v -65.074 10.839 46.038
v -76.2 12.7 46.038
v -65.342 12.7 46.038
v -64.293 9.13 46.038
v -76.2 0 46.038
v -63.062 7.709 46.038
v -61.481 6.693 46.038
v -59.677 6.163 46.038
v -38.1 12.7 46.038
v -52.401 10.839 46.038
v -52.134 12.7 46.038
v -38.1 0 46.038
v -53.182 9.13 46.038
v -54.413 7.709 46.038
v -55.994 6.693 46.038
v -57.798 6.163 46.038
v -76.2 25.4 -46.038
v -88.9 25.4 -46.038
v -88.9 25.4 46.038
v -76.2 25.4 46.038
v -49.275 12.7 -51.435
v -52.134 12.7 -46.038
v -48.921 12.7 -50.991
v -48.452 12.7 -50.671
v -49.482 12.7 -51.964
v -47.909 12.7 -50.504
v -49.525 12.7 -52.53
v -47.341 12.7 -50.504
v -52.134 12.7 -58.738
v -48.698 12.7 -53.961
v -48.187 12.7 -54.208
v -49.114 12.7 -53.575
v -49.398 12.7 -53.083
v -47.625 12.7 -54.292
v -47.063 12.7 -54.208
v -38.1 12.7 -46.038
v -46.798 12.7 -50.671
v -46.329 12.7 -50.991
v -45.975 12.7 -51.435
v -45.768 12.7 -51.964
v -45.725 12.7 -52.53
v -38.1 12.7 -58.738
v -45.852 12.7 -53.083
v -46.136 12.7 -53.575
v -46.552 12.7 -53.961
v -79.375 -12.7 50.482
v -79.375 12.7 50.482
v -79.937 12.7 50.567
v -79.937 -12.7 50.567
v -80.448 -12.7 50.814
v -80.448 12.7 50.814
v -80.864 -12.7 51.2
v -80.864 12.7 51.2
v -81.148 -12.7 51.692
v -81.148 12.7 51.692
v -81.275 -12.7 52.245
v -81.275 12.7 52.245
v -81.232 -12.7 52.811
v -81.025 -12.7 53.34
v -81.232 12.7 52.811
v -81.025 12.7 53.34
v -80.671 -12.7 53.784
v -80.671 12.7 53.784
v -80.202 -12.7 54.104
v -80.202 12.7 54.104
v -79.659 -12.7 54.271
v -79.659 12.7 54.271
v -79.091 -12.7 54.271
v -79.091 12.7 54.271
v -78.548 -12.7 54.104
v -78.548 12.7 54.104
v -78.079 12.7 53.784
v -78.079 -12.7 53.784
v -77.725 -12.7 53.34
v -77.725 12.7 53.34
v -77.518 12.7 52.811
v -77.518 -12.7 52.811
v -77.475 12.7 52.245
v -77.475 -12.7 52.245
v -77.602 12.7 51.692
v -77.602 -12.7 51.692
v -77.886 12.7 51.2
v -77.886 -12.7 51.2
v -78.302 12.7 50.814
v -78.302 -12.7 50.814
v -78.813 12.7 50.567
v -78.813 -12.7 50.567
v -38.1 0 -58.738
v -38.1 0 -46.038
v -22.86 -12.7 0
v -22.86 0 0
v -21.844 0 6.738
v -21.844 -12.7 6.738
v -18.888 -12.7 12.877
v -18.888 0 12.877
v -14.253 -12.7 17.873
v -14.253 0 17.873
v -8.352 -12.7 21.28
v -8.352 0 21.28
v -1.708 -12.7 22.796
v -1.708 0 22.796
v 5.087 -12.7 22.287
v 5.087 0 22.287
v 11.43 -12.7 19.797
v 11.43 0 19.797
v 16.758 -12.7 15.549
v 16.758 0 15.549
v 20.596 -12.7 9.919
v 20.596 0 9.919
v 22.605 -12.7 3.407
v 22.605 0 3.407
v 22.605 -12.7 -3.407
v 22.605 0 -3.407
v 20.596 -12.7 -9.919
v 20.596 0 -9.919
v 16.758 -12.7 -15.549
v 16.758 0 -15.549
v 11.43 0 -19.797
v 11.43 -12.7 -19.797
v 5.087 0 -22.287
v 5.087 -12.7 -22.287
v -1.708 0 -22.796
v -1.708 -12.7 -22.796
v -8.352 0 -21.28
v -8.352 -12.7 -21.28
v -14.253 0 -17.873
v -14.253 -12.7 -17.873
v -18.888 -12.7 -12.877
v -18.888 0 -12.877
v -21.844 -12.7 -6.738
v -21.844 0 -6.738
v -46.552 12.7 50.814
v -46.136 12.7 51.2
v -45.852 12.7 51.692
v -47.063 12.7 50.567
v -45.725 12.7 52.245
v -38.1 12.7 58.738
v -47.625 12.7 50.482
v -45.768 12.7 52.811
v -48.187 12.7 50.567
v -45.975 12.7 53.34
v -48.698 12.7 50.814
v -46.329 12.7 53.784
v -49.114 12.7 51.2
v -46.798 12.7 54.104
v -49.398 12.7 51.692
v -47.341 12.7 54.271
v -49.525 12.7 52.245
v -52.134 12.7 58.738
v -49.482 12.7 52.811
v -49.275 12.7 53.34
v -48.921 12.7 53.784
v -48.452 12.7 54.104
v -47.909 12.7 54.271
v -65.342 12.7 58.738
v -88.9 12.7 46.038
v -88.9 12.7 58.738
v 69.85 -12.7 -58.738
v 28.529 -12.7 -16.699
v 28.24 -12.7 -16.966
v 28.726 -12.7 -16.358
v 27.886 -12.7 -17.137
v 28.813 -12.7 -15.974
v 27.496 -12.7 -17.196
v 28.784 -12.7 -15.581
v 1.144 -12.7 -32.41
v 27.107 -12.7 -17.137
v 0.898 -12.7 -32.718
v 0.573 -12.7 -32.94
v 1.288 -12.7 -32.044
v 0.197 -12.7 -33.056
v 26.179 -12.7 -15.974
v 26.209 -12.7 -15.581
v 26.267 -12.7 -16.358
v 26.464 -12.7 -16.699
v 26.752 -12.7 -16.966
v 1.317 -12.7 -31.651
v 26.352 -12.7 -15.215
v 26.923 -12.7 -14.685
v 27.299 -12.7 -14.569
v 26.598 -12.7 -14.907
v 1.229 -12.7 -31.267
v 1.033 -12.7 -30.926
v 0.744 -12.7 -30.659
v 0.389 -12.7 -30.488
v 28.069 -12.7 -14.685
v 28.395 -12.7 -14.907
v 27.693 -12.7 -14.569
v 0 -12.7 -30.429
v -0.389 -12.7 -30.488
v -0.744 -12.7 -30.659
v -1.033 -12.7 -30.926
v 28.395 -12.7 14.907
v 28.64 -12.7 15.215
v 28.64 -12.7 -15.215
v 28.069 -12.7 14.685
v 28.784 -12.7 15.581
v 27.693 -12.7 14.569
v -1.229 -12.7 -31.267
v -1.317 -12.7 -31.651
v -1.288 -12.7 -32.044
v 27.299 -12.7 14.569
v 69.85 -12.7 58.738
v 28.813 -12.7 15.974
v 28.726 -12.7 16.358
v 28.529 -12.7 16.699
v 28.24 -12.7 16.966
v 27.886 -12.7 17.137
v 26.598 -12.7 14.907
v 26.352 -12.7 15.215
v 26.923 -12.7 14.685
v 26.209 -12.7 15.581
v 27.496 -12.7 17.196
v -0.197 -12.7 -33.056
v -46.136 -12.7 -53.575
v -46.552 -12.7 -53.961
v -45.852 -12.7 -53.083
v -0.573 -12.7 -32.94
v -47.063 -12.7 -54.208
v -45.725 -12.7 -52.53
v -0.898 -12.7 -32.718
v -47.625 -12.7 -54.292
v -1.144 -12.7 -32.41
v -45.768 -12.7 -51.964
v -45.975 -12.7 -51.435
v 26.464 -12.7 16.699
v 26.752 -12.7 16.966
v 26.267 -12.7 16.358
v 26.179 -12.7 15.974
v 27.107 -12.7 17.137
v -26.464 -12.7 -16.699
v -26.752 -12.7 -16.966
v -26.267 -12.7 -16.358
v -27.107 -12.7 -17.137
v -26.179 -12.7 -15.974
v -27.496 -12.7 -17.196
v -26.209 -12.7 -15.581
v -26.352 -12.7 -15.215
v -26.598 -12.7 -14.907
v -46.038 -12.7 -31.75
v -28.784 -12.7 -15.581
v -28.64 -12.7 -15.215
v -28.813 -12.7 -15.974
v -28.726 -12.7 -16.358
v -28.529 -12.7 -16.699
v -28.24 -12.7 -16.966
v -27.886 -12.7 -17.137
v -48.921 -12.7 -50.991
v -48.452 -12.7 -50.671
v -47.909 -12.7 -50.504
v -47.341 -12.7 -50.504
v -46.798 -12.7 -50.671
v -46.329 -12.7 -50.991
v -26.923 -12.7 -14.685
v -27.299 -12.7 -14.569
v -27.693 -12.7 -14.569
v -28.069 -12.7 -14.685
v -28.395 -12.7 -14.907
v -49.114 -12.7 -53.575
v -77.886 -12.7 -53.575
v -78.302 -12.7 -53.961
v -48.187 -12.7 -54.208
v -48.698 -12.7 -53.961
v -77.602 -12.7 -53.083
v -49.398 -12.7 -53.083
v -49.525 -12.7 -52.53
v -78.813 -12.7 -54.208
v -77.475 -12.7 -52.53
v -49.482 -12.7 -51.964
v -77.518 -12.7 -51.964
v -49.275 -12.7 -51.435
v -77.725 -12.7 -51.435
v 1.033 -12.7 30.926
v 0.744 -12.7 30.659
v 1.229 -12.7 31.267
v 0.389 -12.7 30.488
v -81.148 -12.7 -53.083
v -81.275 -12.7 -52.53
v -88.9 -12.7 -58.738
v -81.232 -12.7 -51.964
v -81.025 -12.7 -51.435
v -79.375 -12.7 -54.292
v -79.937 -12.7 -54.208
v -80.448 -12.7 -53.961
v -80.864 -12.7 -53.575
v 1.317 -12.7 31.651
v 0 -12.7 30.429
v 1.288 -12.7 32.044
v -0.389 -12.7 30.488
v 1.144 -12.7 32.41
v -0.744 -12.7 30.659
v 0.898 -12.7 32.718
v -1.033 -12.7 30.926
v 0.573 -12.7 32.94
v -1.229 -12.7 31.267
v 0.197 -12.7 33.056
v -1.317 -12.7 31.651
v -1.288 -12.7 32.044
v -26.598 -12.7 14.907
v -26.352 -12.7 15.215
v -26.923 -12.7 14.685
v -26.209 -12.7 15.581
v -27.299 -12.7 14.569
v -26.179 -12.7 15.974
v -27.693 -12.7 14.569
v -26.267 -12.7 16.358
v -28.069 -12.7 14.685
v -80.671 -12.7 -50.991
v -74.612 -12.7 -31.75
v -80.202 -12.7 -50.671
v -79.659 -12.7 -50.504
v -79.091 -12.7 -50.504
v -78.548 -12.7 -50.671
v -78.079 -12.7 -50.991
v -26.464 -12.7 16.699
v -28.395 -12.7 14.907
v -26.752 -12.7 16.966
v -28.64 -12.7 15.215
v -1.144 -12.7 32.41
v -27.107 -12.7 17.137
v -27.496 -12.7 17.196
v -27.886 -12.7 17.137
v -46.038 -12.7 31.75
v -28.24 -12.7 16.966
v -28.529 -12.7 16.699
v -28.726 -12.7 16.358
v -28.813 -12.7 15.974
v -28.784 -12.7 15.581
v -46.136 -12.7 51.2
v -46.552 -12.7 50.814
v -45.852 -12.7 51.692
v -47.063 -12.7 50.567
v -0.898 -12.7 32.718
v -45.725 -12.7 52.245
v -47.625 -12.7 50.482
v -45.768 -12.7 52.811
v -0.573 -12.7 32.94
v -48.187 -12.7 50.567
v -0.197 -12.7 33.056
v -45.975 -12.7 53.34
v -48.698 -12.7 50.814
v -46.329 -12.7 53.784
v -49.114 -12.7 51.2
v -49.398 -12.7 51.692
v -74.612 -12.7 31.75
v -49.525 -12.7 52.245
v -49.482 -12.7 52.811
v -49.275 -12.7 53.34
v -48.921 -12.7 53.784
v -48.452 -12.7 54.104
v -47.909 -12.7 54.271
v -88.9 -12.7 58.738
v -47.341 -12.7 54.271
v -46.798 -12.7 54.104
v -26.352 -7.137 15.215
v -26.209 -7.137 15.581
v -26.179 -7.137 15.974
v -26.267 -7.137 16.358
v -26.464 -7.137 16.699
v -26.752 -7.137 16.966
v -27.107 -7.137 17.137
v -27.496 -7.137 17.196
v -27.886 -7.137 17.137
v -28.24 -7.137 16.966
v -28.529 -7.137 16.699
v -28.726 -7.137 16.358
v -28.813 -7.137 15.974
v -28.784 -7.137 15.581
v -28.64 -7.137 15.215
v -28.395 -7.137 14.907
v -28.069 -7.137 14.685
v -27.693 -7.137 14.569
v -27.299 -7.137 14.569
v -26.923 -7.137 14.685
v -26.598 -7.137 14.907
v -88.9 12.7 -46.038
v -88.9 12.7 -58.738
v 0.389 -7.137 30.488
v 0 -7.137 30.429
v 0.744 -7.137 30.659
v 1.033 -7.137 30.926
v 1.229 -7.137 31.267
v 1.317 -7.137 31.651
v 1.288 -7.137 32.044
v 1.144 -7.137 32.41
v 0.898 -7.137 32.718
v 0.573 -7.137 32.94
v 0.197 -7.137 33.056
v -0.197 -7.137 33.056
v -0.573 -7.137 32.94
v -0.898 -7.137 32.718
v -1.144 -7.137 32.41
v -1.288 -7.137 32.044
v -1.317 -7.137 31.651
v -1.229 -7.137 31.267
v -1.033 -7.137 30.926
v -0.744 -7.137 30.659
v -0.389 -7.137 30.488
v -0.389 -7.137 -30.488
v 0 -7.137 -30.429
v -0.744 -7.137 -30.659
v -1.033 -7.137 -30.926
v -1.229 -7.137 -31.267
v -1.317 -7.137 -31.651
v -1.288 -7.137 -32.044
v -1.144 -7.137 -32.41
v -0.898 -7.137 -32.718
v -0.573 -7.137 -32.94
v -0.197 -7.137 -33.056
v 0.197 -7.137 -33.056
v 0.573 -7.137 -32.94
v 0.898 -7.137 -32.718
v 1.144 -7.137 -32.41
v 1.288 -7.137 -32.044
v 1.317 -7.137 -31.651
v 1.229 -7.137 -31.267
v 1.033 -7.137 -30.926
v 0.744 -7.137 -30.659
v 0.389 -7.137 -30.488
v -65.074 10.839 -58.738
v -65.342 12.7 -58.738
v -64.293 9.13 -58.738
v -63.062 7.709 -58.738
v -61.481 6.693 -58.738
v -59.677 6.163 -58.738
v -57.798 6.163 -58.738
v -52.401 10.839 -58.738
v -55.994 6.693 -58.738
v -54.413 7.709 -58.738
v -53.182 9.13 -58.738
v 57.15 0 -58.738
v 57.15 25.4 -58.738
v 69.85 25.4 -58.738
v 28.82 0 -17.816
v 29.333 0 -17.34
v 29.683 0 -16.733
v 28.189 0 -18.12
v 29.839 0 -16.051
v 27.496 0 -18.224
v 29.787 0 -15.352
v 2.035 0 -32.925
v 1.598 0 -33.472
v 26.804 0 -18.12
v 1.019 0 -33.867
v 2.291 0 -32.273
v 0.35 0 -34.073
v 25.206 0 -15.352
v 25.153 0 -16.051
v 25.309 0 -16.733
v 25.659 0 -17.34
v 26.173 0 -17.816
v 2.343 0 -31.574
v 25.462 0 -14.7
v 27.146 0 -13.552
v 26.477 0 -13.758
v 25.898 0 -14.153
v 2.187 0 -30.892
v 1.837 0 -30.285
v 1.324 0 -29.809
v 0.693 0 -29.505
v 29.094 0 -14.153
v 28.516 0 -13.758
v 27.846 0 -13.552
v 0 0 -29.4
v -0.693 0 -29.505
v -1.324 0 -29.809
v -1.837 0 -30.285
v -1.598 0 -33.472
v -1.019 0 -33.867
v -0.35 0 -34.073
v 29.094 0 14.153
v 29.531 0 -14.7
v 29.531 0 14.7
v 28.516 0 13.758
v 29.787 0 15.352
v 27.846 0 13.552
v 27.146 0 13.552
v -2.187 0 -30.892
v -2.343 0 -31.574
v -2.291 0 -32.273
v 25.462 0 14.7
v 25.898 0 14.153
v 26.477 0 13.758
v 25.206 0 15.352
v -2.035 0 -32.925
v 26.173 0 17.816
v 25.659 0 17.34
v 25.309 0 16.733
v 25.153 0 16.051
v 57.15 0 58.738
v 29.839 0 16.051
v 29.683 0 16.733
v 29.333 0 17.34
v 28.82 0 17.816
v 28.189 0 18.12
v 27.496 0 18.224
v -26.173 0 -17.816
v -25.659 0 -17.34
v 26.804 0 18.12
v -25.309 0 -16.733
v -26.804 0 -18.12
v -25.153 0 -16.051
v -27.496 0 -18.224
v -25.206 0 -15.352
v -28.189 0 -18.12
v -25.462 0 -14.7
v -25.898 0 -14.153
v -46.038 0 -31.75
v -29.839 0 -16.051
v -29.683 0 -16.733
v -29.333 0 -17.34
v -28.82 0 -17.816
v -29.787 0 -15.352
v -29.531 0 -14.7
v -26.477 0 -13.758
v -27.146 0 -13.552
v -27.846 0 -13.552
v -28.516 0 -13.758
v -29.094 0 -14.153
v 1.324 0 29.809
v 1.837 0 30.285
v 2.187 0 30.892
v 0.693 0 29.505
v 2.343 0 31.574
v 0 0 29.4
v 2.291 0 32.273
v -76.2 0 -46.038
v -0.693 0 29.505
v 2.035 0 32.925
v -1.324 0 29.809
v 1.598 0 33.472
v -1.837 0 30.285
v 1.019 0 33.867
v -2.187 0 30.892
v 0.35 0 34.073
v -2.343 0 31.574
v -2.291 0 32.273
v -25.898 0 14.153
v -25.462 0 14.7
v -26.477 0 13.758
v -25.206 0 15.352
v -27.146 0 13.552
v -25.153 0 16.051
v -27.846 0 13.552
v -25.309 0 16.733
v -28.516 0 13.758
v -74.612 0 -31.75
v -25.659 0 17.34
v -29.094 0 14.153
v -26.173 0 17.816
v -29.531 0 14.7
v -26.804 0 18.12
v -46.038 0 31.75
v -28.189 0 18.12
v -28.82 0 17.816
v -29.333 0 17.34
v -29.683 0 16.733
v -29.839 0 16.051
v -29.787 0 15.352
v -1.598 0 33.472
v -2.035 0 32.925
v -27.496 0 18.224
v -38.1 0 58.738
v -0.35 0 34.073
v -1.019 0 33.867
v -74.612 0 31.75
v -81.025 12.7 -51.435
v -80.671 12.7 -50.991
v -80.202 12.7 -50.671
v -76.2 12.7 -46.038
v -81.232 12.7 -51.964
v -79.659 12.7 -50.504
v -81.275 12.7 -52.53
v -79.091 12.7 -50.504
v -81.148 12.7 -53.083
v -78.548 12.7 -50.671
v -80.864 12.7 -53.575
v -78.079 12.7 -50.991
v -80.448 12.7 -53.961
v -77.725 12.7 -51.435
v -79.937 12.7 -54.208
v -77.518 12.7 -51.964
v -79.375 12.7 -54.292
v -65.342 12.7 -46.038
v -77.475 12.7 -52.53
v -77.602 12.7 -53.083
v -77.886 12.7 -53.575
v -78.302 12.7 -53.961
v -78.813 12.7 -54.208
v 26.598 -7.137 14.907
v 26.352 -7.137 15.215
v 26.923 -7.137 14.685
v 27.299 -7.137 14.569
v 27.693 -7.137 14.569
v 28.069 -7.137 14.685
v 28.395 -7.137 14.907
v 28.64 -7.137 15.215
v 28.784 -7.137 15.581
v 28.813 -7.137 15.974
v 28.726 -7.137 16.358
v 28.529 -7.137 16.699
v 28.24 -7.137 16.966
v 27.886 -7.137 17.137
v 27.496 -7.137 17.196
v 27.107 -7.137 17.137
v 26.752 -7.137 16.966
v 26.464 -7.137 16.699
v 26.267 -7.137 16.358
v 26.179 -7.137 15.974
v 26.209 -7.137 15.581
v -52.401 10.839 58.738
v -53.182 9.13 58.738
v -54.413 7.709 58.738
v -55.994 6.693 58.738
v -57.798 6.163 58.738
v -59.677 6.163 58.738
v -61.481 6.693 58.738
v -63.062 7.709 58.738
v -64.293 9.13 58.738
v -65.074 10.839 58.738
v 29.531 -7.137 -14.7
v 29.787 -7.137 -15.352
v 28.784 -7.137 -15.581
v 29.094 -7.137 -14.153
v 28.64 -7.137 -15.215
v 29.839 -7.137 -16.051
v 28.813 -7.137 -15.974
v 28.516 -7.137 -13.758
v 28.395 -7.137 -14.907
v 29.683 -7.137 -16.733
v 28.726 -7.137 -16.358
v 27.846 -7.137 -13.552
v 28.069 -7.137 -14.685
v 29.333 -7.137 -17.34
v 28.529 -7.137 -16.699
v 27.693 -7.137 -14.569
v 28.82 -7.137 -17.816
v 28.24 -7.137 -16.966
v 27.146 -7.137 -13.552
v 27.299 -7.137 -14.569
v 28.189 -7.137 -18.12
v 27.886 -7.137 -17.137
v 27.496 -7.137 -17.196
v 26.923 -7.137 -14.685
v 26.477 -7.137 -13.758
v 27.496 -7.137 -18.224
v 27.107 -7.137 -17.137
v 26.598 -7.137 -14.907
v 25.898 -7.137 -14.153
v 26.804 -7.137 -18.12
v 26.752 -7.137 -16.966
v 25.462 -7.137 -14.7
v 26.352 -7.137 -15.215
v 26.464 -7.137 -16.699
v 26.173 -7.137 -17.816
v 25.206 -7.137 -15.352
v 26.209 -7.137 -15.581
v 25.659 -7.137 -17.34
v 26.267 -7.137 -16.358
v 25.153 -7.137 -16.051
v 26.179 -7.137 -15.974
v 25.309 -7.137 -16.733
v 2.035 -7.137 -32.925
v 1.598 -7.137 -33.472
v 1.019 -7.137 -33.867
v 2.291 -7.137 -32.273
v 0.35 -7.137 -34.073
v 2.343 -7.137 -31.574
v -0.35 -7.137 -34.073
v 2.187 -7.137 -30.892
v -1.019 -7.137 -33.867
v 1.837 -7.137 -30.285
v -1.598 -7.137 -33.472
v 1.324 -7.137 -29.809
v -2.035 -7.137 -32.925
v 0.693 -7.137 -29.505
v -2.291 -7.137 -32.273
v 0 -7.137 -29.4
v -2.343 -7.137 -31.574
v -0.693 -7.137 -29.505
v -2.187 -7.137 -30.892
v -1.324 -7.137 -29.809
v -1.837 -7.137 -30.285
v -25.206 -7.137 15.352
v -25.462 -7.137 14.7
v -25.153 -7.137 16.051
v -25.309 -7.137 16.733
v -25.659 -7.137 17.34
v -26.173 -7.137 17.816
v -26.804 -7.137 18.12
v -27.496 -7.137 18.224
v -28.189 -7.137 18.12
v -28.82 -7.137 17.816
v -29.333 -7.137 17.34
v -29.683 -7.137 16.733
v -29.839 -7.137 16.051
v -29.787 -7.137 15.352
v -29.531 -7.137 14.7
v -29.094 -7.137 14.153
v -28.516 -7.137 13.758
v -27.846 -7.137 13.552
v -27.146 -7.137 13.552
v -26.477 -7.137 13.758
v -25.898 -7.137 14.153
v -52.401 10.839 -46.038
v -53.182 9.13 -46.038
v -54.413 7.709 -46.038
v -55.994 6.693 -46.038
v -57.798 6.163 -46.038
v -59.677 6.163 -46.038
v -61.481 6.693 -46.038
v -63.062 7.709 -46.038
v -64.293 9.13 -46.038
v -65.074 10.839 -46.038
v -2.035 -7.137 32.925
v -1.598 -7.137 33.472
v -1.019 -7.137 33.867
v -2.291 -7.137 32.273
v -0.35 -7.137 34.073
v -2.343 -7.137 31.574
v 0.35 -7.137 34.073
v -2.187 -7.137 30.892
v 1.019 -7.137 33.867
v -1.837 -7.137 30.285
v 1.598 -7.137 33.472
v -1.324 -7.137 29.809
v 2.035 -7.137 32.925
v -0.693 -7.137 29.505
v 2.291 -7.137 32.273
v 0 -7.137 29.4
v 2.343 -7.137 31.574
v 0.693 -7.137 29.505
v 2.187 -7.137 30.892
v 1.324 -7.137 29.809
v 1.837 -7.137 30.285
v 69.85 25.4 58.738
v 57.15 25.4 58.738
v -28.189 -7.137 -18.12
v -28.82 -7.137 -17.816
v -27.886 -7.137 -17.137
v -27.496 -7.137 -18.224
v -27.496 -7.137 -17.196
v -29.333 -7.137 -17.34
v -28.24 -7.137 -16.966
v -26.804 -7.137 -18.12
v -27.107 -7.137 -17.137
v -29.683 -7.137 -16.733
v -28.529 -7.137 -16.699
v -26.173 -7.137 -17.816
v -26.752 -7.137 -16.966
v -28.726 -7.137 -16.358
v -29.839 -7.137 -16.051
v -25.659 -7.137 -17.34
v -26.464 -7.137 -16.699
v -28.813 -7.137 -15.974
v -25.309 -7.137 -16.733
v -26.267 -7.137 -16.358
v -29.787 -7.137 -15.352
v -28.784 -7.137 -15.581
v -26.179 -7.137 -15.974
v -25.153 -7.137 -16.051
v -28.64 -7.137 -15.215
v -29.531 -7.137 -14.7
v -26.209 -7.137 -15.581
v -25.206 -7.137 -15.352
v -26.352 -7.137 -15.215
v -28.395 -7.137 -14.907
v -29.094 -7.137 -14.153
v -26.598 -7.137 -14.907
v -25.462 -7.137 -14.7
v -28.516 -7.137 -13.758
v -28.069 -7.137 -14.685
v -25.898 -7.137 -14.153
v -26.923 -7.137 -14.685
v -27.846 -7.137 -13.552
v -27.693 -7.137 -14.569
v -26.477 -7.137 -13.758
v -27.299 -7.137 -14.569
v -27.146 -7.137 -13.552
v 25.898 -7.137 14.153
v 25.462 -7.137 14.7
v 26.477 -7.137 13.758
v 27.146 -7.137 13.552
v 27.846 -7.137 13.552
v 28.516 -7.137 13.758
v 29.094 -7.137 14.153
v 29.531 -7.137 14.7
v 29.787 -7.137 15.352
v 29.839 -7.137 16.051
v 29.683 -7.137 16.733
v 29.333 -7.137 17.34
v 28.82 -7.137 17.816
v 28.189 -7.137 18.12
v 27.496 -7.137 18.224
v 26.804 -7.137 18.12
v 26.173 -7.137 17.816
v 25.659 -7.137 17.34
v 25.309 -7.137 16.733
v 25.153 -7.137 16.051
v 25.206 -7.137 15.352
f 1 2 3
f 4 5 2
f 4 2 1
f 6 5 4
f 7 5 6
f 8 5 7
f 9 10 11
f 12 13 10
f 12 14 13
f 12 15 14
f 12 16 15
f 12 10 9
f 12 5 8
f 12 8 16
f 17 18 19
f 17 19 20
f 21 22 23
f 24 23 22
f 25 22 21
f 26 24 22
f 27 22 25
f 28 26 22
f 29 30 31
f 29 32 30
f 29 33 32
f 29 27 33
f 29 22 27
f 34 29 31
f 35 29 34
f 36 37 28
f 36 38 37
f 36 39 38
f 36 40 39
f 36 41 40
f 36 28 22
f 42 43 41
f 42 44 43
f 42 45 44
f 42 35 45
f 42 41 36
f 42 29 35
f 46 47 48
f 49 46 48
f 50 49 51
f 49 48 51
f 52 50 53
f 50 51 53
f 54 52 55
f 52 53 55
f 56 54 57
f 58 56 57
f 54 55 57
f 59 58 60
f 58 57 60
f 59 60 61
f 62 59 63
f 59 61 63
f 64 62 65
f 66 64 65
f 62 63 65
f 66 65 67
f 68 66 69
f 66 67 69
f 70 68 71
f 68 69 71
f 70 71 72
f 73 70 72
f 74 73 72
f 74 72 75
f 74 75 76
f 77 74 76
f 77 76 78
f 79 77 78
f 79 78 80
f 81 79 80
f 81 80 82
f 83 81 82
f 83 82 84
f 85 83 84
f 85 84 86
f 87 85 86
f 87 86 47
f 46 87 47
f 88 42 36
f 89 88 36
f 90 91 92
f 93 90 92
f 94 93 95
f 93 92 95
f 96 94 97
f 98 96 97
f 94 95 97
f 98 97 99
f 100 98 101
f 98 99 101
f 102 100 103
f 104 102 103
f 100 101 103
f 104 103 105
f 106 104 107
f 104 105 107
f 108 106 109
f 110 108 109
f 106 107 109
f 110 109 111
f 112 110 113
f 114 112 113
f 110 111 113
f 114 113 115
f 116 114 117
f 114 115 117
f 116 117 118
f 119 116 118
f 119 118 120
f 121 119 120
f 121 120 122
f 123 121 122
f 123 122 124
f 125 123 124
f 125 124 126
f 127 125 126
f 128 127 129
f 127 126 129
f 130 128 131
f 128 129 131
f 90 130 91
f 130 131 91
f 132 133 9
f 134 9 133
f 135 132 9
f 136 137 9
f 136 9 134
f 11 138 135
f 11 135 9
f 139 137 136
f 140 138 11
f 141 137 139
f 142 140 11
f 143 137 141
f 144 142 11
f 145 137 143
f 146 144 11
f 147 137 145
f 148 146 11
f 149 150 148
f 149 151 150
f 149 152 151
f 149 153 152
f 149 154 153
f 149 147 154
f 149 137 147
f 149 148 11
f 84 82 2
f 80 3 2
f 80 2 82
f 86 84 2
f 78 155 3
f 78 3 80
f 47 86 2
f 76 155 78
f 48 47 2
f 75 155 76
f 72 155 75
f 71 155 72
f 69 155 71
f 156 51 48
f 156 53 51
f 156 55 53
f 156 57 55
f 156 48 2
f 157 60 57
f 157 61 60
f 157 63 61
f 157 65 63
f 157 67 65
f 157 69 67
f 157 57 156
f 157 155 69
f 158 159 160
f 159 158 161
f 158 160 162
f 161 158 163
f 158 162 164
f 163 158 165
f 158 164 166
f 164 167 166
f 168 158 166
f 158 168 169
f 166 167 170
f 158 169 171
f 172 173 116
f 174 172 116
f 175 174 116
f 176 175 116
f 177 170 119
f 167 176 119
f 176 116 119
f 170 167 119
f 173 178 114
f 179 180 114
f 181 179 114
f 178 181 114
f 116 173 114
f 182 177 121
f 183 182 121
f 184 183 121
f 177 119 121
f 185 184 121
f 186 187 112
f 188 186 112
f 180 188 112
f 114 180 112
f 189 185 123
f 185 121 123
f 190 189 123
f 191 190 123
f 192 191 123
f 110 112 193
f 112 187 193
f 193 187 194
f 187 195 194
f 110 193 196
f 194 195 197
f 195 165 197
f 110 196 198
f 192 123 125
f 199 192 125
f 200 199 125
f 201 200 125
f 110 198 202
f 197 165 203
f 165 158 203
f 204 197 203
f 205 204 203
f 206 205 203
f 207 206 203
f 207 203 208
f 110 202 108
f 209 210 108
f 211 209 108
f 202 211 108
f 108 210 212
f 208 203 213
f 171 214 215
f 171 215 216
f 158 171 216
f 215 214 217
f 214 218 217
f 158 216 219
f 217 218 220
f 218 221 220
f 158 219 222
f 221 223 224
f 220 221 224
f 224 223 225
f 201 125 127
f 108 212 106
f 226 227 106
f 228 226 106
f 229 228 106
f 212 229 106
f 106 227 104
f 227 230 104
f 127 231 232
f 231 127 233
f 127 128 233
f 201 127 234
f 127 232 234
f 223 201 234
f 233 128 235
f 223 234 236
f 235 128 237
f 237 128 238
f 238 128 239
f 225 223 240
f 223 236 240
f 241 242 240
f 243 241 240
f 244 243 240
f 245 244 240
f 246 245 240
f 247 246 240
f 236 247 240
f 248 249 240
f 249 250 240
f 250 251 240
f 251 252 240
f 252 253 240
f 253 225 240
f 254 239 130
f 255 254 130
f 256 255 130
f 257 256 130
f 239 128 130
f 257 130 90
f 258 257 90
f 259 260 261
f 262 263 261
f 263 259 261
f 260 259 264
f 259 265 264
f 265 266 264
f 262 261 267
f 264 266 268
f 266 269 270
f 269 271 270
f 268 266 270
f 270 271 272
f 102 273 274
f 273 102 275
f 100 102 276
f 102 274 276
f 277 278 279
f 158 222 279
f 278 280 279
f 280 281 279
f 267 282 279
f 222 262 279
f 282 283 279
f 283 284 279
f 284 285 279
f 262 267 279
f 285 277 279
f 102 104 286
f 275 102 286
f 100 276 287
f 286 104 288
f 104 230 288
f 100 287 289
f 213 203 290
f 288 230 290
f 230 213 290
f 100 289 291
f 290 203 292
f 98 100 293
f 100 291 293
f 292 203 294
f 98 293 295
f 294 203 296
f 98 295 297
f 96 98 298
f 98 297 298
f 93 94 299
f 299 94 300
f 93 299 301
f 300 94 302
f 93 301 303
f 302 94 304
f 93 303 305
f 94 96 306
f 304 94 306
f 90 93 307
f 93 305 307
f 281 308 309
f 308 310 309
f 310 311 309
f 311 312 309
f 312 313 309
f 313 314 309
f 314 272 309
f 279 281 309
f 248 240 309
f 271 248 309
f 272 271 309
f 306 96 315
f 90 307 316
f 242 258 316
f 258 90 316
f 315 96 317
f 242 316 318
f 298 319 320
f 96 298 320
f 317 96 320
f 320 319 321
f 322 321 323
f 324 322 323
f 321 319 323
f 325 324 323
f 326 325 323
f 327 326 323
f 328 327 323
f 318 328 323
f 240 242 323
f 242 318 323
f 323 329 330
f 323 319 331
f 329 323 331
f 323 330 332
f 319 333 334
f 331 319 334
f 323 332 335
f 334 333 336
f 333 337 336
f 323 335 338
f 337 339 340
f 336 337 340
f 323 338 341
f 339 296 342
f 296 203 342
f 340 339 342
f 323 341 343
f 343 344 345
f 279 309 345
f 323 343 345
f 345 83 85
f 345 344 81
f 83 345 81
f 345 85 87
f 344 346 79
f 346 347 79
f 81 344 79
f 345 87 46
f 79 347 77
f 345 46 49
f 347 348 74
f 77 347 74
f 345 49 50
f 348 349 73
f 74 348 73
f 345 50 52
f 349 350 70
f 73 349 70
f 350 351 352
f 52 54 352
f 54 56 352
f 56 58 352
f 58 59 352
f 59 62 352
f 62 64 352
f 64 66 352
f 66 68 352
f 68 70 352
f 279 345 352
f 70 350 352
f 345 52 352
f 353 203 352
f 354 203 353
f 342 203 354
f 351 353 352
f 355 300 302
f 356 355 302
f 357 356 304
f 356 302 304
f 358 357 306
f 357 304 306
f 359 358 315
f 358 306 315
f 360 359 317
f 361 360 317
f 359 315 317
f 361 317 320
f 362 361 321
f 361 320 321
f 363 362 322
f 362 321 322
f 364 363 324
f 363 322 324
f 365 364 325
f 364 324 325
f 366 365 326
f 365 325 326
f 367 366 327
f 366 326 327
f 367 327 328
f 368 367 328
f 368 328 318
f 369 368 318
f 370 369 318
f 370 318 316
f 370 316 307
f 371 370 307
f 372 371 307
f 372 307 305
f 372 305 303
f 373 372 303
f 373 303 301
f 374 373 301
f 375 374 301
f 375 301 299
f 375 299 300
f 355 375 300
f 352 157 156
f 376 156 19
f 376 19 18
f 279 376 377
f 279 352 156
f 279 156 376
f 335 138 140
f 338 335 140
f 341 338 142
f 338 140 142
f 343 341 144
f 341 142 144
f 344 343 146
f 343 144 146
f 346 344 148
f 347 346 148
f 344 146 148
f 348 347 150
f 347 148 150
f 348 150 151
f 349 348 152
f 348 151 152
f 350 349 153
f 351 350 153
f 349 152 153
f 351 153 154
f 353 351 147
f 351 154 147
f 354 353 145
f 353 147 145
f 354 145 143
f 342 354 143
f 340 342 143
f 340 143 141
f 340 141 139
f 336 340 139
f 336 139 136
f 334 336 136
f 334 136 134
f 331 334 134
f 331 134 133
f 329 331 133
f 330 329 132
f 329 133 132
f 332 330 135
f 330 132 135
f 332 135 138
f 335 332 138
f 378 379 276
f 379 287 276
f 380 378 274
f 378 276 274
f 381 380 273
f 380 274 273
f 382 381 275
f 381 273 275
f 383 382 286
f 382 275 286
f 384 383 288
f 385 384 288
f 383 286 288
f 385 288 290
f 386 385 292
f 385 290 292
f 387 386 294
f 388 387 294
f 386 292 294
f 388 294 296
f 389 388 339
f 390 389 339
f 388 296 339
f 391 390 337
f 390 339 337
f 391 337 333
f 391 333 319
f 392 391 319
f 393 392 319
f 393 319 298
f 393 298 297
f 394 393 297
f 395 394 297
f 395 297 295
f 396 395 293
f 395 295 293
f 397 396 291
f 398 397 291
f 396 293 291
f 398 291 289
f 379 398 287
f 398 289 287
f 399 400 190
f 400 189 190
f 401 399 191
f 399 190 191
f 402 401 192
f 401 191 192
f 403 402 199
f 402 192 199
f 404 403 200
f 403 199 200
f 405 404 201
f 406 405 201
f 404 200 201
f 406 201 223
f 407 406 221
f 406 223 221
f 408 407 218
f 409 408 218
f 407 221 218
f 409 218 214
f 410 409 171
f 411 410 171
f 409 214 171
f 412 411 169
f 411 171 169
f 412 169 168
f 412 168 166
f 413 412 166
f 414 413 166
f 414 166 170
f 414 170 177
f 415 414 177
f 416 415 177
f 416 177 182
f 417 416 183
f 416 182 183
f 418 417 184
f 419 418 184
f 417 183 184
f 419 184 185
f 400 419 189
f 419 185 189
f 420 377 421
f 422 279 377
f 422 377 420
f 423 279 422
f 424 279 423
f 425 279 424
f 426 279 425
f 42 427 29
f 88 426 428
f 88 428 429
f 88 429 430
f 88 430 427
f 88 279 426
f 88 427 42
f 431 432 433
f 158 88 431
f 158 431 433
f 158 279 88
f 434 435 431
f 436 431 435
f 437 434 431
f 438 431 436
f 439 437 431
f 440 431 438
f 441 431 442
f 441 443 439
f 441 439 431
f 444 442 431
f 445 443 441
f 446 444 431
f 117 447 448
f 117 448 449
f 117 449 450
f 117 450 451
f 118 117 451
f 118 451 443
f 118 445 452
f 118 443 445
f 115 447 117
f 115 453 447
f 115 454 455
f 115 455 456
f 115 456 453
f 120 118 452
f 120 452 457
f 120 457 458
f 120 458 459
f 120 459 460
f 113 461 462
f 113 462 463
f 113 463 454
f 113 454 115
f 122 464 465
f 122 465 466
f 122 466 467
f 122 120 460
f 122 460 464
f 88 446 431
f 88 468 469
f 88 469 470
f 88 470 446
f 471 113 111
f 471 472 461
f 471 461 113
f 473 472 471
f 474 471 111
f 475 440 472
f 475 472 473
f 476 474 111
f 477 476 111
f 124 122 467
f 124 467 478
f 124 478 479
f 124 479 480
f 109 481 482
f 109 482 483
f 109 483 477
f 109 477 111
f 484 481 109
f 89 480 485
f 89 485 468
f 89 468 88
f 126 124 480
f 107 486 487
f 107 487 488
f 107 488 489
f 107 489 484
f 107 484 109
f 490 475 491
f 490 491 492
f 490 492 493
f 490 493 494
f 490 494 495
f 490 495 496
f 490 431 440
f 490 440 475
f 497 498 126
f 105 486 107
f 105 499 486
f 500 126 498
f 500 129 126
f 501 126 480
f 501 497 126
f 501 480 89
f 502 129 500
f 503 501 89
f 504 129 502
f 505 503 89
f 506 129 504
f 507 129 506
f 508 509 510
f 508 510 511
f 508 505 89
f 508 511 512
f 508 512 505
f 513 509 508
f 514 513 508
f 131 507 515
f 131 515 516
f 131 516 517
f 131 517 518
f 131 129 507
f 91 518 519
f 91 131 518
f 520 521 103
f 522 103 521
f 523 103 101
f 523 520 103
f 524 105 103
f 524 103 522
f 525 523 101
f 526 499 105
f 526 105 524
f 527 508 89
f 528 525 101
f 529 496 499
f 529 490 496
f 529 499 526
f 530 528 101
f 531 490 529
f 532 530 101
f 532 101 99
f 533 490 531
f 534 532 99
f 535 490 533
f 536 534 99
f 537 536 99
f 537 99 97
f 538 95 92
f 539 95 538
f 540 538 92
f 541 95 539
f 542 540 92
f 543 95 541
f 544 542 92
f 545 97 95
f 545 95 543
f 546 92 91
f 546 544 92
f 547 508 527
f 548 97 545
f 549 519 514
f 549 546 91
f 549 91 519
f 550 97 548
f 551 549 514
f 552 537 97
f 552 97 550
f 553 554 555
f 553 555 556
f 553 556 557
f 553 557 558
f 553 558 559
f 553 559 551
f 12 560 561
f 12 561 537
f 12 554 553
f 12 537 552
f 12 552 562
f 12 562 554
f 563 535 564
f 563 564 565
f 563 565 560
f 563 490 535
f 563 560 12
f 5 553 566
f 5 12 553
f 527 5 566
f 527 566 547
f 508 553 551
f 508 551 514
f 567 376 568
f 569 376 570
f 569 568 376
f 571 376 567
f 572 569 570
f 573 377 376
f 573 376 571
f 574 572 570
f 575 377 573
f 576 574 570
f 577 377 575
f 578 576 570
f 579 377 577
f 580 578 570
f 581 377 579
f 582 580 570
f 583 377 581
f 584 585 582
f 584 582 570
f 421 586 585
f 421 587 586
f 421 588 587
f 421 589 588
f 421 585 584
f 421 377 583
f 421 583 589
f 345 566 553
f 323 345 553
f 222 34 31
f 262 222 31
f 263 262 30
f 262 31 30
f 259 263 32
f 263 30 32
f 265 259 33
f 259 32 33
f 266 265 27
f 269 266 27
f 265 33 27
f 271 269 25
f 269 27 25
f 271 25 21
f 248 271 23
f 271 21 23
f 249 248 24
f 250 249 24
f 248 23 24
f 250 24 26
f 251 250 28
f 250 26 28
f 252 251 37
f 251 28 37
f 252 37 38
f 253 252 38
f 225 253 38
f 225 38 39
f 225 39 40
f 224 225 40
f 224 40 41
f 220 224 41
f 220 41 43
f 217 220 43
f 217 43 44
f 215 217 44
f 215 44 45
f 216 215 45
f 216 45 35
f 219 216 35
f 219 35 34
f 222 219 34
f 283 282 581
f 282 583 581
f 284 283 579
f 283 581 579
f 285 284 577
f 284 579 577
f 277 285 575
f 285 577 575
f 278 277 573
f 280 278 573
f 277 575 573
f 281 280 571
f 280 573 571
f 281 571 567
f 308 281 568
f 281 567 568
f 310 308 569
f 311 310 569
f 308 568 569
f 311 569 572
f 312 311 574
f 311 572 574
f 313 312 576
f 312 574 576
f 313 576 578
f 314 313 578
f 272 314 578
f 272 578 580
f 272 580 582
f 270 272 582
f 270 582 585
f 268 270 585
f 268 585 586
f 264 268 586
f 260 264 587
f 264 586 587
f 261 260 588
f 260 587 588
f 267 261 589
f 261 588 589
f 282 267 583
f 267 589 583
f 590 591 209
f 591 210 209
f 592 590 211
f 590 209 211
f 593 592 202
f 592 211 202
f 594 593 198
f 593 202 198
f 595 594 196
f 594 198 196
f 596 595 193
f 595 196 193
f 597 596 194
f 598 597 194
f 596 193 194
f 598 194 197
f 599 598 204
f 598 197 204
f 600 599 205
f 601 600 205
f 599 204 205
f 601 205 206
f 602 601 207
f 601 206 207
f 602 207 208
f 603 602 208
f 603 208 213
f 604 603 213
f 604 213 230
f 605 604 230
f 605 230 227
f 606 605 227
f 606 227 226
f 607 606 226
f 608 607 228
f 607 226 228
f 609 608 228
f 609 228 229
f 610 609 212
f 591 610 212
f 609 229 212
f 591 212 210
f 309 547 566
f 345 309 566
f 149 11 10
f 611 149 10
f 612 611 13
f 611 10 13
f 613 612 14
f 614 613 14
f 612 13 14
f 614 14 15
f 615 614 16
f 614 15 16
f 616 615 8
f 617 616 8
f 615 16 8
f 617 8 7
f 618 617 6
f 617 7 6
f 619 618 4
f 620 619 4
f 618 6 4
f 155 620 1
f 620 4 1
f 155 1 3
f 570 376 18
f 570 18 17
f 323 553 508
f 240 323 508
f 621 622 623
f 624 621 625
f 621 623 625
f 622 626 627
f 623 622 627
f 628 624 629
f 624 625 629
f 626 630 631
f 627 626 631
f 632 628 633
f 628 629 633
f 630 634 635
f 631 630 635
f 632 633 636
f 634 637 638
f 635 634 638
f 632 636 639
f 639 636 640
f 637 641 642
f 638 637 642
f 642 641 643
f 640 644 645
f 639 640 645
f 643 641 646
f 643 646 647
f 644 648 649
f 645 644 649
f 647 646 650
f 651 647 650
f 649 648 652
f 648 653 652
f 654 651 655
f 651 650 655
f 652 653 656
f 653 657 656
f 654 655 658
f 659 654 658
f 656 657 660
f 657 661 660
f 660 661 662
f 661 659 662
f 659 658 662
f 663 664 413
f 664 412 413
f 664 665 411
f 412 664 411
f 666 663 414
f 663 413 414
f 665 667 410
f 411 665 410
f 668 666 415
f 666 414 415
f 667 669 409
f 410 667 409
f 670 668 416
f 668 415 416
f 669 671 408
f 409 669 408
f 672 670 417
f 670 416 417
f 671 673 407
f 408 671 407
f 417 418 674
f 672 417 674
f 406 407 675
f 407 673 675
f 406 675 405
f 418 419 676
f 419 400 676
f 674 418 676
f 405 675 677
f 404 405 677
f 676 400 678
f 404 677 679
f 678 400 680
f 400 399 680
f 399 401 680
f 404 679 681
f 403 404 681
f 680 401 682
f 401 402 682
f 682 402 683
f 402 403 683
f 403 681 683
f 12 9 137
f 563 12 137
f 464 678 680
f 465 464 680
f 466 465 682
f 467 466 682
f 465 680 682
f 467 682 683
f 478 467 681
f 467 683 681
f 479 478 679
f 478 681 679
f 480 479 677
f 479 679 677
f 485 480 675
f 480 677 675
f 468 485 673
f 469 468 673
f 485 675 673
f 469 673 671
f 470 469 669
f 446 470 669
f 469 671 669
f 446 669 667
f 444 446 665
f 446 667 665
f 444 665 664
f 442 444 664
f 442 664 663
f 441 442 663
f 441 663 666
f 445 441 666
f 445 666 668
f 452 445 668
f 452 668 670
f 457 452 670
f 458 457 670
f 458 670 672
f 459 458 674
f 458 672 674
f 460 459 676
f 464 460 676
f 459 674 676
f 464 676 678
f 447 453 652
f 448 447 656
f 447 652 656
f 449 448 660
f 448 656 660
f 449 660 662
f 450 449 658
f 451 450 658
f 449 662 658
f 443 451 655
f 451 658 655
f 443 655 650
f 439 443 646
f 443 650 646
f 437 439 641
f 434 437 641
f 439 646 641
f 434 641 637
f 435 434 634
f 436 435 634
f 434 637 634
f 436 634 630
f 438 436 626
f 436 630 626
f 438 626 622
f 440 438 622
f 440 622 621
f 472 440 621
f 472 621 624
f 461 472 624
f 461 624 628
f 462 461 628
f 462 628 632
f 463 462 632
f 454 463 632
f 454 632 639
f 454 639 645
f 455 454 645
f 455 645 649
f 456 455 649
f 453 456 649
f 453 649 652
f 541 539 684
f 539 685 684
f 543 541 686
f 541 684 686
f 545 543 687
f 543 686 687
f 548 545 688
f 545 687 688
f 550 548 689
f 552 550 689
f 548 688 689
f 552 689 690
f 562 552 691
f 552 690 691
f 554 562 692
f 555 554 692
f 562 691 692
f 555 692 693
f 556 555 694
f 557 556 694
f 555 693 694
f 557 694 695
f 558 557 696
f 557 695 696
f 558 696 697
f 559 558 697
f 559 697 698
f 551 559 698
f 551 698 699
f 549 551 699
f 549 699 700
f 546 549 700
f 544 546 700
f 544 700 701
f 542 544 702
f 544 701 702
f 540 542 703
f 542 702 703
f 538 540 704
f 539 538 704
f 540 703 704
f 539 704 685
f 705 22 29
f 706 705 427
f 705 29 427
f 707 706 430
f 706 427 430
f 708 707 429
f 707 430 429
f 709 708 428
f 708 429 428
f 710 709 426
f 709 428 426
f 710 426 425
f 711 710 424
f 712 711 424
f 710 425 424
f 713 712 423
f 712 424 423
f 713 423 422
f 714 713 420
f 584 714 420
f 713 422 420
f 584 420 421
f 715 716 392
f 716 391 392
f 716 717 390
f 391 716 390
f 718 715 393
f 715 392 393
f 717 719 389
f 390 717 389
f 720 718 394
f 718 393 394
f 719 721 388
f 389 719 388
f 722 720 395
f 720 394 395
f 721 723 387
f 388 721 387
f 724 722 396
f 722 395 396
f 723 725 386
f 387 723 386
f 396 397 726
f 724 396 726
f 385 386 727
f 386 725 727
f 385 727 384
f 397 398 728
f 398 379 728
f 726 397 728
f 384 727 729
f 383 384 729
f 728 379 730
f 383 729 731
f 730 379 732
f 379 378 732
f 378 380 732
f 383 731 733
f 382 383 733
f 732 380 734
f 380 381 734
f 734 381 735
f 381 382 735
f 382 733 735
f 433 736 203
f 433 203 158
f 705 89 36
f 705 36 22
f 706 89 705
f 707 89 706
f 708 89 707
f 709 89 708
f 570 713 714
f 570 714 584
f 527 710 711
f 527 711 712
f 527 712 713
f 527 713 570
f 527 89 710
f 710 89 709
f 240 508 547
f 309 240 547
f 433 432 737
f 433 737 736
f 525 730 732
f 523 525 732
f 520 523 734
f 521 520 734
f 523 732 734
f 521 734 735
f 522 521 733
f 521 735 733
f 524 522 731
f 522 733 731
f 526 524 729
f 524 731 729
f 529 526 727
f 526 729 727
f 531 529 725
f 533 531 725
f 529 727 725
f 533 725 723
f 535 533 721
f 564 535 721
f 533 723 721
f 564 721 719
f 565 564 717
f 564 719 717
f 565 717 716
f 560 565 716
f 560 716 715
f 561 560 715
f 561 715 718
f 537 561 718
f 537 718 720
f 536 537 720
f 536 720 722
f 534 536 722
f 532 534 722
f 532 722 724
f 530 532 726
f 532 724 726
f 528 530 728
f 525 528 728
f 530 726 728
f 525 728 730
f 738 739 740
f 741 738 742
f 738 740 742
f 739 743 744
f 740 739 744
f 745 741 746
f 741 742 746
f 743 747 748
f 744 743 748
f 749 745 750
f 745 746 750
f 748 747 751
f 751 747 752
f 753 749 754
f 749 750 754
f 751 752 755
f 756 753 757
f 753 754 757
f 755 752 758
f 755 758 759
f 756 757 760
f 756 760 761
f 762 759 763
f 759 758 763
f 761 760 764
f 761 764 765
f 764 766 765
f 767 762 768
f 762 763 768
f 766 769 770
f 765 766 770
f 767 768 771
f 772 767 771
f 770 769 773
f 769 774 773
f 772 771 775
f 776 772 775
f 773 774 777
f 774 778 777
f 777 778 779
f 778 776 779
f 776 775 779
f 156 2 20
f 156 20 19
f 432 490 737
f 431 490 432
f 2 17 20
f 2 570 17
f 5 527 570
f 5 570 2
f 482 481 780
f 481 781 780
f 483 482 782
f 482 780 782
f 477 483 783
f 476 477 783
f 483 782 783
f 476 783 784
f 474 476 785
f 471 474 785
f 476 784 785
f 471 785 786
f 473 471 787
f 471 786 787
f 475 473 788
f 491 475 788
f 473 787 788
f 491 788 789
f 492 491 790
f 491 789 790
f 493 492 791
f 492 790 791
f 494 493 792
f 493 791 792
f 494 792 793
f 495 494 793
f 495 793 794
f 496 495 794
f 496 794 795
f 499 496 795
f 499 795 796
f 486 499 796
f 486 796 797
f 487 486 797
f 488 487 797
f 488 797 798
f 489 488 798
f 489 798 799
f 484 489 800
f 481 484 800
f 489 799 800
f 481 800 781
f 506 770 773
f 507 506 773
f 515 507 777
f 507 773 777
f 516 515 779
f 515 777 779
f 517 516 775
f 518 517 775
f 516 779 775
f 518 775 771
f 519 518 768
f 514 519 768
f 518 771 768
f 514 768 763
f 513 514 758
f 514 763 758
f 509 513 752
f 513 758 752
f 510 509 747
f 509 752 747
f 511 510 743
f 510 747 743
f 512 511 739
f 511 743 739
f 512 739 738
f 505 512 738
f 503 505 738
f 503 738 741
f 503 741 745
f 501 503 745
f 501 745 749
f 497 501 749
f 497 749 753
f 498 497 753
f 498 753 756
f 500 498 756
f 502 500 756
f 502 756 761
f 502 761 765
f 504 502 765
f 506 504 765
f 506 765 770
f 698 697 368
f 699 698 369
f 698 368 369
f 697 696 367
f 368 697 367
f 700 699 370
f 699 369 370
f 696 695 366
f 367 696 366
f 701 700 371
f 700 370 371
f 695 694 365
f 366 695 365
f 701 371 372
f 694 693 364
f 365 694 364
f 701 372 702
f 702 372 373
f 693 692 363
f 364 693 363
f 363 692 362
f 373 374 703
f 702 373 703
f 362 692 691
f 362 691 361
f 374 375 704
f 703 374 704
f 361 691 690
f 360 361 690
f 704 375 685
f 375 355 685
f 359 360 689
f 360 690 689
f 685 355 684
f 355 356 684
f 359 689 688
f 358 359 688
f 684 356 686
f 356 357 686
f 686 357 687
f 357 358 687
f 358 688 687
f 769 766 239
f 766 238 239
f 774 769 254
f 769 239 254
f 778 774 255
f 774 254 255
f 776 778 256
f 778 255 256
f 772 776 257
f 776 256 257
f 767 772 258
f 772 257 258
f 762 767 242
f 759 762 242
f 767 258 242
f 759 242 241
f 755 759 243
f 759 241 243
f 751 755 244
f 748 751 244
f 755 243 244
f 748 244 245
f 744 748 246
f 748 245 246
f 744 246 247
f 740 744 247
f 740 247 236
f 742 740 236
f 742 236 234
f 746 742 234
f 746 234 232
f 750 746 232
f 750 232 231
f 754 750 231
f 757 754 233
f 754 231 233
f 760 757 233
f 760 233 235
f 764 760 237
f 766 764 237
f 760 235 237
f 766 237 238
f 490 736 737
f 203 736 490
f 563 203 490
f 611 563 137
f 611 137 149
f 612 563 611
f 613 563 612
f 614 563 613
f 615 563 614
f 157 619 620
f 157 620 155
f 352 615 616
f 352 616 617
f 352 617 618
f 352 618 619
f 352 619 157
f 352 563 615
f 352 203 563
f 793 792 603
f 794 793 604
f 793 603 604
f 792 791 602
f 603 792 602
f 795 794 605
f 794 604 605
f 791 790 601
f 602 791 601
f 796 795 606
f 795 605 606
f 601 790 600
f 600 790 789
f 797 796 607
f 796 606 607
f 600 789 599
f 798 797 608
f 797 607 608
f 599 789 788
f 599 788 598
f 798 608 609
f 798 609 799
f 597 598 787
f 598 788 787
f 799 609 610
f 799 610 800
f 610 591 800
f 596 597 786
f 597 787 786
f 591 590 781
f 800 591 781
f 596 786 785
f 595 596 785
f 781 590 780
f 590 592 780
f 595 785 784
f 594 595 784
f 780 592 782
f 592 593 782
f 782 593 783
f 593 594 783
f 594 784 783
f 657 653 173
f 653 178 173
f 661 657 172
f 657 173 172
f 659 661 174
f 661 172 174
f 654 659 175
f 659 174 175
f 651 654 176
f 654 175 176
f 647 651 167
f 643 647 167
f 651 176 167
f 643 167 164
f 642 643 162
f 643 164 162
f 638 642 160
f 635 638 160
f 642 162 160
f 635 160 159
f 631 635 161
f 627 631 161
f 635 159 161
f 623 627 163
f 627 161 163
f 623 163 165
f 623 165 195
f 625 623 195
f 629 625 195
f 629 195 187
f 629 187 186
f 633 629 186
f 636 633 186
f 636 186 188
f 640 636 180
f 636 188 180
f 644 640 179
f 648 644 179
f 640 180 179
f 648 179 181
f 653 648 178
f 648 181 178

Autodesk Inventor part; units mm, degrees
ref_plane "YZ Plane" through (0, 0, 0) normal (1, 0, 0) x (0, 1, 0)
ref_plane "XZ Plane" through (0, 0, 0) normal (0, 1, 0) x (-1, 0, 0)
sketch "Sketch10" plane through (0, 0, 0) normal (0, 1, 0) x (-1, 0, 0)
  line L0 (88.9, 58.7375) -> (-88.9, 58.7375)
  line L1 (-88.9, 58.7375) -> (-88.9, -58.7375)
  line L2 (-88.9, -58.7375) -> (88.9, -58.7375)
  line L3 (88.9, -58.7375) -> (88.9, 58.7375)
  line L4 (88.9, 58.7375) -> (-88.9, -58.7375) construction
  line L5 (-88.9, 58.7375) -> (88.9, -58.7375) construction
  circle A0 centre (0, 0) radius 22.86
  dimension "d56" = 177.8
  dimension "d57" = 45.72
extrude "Extrusion5" add sketch "Sketch10" against normal blind 12.7
sketch "Sketch11" plane through (0, 0, 0) normal (0, 1, 0) x (1, 0, 0)
  point P0 (0, 0)
  point P1 (0, 31.75)
  dimension "d60" = 31.75
hole "Hole4" at (0, 0, -31.75) direction (0, -1, 0) diameter 2.6416 end through all counterbore diameter 4.699 counterbore depth 7.1374 thread size "6-32 UNC" class "2B" standard "ANSI Unified Screw Threads"
pattern_circular "Circular Pattern1" count 6 over 360 about axis through (0, -10, 0) along (0, 1, 0) of "Hole4"
sketch "Sketch12" plane through (0, 0, 0) normal (0, 1, 0) x (1, 0, 0)
  line L0 (-88.9, -58.7375) -> (-88.9, 58.7375) projected
  line L1 (-88.9, 58.7375) -> (-38.1, 58.7375)
  line L2 (-38.1, 58.7375) -> (-38.1, 46.0375)
  line L3 (-38.1, 46.0375) -> (-88.9, 46.0375)
  line L4 (-88.9, 46.0375) -> (-88.9, 58.7375)
  point P0 (0, 0)
  dimension "d71" = 12.7
  dimension "d72" = 50.8
extrude "Extrusion6" add sketch "Sketch12" along normal blind 12.7
mirror "Mirror2" about plane through (0, 0, 0) normal (0, 0, 1) of "Extrusion6"
sketch "Sketch13" plane through (88.9, -12.7, -58.7375) normal (0, 0, -1) x (-1, 0, 0)
  line L0 (127, 25.4) -> (177.8, 25.4) projected
  circle A0 centre (147.6375, 25.4) radius 6.604
  point P0 (88.9, 12.7)
  dimension "d75" = 13.208
extrude "Extrusion7" cut sketch "Sketch13" against normal through all
sketch "Sketch14" plane through (0, 0, 0) normal (0, 1, 0) x (1, 0, 0)
  line L0 (-88.9, 46.0375) -> (-76.2, 46.0375)
  line L1 (-76.2, 46.0375) -> (-76.2, -46.0375)
  line L2 (-76.2, -46.0375) -> (-88.9, -46.0375)
  line L3 (-88.9, -46.0375) -> (-88.9, 46.0375)
  point P0 (0, 0)
  dimension "d78" = 12.7
extrude "Extrusion8" add sketch "Sketch14" along normal blind 25.4
sketch "Sketch15" plane through (0, 0, 0) normal (0, 1, 0) x (1, 0, 0)
  line L0 (88.9, 58.7375) -> (-38.1, 58.7375) projected
  line L1 (-38.1, -58.7375) -> (88.9, -58.7375) projected
  line L2 (57.15, 58.7375) -> (69.85, 58.7375)
  line L3 (69.85, 58.7375) -> (69.85, -58.7375)
  line L4 (69.85, -58.7375) -> (57.15, -58.7375)
  line L5 (57.15, -58.7375) -> (57.15, 58.7375)
  line L6 (-88.9, 46.0375) -> (-88.9, -46.0375) projected
  point P0 (0, 0)
  dimension "d81" = 12.7
  dimension "d82" = 146.05
extrude "Extrusion9" add sketch "Sketch15" along normal blind 25.4
sketch "Sketch16" plane through (0, 0, 0) normal (0, 1, 0) x (1, 0, 0)
  line L0 (88.9, 58.7375) -> (69.85, 58.7375) projected
  line L1 (88.9, -58.7375) -> (69.85, -58.7375)
  line L2 (69.85, -58.7375) -> (69.85, 58.7375)
  line L3 (69.85, 58.7375) -> (88.9, 58.7375)
  line L4 (88.9, 58.7375) -> (88.9, -58.7375)
  point P0 (0, 0)
extrude "Extrusion10" cut sketch "Sketch16" against normal through all
sketch "Sketch18" plane through (0, -12.7, 0) normal (0, -1, 0) x (1, 0, 0)
  line L0 (-88.9, 58.7375) -> (-88.9, 46.0375) construction
  line L1 (-88.9, 52.3875) -> (69.85, 52.3875) construction
  line L2 (69.85, 58.7375) -> (69.85, -58.7375) construction
  line L3 (-88.9, -58.7375) -> (-88.9, -46.0375) construction
  line L4 (-88.9, -52.3875) -> (69.85, -52.3875) construction
  line L5 (-65.3415, -46.0375) -> (-65.3415, -58.7375) projected
  line L6 (-65.3415, -58.7375) -> (-88.9, -58.7375) projected
  line L7 (-88.9, -58.7375) -> (-88.9, -46.0375) projected
  line L8 (-88.9, -46.0375) -> (-76.2, -46.0375) projected
  line L9 (-76.2, -46.0375) -> (-65.3415, -46.0375) projected
  line L10 (-52.1335, -58.7375) -> (-52.1335, -46.0375) projected
  line L11 (-52.1335, -46.0375) -> (-38.1, -46.0375) projected
  line L12 (-38.1, -46.0375) -> (-38.1, -58.7375) projected
  line L13 (-38.1, -58.7375) -> (-52.1335, -58.7375) projected
  line L14 (-88.9, 58.7375) -> (-88.9, -58.7375) projected
  line L15 (-88.9, 0) -> (69.85, 0) construction
  line L16 (69.85, -58.7375) -> (69.85, 58.7375) construction
  point P0 (0, 0)
  point P1 (-79.375, -52.3875)
  point P2 (-47.625, -52.3875)
  point P3 (-79.375, 52.3875)
  point P4 (-47.625, 52.3875)
  dimension "d94" = 9.525
  dimension "d95" = 9.525
hole "Hole6" at (-79.375, -12.7, -52.3875) at (-47.625, -12.7, -52.3875) at (-79.375, -12.7, 52.3875) at (-47.625, -12.7, 52.3875) direction (0, 1, 0) diameter 3.81 end through all clearance for "Flat Head Machine Screw (82)" size "#6" standard "Ansi Unified Screw Threads"
sketch "Sketch19" plane through (0, 0, 0) normal (0, 1, 0) x (1, 0, 0)
  line L0 (-74.6125, 31.75) -> (-74.6125, -31.75)
  line L1 (-74.6125, -31.75) -> (-46.0375, -31.75)
  line L2 (-46.0375, -31.75) -> (-46.0375, 31.75)
  line L3 (-46.0375, 31.75) -> (-74.6125, 31.75)
  line L4 (-74.6125, 31.75) -> (-46.0375, -31.75) construction
  line L5 (-74.6125, -31.75) -> (-46.0375, 31.75) construction
  point P0 (0, 0)
  point P1 (-60.325, 0)
extrude "Extrusion11" cut sketch "Sketch19" against normal blind 12.7
equation "\"length\" = 69.0372"
properties part number "SupportForAxel" material "PBT Plastic"
